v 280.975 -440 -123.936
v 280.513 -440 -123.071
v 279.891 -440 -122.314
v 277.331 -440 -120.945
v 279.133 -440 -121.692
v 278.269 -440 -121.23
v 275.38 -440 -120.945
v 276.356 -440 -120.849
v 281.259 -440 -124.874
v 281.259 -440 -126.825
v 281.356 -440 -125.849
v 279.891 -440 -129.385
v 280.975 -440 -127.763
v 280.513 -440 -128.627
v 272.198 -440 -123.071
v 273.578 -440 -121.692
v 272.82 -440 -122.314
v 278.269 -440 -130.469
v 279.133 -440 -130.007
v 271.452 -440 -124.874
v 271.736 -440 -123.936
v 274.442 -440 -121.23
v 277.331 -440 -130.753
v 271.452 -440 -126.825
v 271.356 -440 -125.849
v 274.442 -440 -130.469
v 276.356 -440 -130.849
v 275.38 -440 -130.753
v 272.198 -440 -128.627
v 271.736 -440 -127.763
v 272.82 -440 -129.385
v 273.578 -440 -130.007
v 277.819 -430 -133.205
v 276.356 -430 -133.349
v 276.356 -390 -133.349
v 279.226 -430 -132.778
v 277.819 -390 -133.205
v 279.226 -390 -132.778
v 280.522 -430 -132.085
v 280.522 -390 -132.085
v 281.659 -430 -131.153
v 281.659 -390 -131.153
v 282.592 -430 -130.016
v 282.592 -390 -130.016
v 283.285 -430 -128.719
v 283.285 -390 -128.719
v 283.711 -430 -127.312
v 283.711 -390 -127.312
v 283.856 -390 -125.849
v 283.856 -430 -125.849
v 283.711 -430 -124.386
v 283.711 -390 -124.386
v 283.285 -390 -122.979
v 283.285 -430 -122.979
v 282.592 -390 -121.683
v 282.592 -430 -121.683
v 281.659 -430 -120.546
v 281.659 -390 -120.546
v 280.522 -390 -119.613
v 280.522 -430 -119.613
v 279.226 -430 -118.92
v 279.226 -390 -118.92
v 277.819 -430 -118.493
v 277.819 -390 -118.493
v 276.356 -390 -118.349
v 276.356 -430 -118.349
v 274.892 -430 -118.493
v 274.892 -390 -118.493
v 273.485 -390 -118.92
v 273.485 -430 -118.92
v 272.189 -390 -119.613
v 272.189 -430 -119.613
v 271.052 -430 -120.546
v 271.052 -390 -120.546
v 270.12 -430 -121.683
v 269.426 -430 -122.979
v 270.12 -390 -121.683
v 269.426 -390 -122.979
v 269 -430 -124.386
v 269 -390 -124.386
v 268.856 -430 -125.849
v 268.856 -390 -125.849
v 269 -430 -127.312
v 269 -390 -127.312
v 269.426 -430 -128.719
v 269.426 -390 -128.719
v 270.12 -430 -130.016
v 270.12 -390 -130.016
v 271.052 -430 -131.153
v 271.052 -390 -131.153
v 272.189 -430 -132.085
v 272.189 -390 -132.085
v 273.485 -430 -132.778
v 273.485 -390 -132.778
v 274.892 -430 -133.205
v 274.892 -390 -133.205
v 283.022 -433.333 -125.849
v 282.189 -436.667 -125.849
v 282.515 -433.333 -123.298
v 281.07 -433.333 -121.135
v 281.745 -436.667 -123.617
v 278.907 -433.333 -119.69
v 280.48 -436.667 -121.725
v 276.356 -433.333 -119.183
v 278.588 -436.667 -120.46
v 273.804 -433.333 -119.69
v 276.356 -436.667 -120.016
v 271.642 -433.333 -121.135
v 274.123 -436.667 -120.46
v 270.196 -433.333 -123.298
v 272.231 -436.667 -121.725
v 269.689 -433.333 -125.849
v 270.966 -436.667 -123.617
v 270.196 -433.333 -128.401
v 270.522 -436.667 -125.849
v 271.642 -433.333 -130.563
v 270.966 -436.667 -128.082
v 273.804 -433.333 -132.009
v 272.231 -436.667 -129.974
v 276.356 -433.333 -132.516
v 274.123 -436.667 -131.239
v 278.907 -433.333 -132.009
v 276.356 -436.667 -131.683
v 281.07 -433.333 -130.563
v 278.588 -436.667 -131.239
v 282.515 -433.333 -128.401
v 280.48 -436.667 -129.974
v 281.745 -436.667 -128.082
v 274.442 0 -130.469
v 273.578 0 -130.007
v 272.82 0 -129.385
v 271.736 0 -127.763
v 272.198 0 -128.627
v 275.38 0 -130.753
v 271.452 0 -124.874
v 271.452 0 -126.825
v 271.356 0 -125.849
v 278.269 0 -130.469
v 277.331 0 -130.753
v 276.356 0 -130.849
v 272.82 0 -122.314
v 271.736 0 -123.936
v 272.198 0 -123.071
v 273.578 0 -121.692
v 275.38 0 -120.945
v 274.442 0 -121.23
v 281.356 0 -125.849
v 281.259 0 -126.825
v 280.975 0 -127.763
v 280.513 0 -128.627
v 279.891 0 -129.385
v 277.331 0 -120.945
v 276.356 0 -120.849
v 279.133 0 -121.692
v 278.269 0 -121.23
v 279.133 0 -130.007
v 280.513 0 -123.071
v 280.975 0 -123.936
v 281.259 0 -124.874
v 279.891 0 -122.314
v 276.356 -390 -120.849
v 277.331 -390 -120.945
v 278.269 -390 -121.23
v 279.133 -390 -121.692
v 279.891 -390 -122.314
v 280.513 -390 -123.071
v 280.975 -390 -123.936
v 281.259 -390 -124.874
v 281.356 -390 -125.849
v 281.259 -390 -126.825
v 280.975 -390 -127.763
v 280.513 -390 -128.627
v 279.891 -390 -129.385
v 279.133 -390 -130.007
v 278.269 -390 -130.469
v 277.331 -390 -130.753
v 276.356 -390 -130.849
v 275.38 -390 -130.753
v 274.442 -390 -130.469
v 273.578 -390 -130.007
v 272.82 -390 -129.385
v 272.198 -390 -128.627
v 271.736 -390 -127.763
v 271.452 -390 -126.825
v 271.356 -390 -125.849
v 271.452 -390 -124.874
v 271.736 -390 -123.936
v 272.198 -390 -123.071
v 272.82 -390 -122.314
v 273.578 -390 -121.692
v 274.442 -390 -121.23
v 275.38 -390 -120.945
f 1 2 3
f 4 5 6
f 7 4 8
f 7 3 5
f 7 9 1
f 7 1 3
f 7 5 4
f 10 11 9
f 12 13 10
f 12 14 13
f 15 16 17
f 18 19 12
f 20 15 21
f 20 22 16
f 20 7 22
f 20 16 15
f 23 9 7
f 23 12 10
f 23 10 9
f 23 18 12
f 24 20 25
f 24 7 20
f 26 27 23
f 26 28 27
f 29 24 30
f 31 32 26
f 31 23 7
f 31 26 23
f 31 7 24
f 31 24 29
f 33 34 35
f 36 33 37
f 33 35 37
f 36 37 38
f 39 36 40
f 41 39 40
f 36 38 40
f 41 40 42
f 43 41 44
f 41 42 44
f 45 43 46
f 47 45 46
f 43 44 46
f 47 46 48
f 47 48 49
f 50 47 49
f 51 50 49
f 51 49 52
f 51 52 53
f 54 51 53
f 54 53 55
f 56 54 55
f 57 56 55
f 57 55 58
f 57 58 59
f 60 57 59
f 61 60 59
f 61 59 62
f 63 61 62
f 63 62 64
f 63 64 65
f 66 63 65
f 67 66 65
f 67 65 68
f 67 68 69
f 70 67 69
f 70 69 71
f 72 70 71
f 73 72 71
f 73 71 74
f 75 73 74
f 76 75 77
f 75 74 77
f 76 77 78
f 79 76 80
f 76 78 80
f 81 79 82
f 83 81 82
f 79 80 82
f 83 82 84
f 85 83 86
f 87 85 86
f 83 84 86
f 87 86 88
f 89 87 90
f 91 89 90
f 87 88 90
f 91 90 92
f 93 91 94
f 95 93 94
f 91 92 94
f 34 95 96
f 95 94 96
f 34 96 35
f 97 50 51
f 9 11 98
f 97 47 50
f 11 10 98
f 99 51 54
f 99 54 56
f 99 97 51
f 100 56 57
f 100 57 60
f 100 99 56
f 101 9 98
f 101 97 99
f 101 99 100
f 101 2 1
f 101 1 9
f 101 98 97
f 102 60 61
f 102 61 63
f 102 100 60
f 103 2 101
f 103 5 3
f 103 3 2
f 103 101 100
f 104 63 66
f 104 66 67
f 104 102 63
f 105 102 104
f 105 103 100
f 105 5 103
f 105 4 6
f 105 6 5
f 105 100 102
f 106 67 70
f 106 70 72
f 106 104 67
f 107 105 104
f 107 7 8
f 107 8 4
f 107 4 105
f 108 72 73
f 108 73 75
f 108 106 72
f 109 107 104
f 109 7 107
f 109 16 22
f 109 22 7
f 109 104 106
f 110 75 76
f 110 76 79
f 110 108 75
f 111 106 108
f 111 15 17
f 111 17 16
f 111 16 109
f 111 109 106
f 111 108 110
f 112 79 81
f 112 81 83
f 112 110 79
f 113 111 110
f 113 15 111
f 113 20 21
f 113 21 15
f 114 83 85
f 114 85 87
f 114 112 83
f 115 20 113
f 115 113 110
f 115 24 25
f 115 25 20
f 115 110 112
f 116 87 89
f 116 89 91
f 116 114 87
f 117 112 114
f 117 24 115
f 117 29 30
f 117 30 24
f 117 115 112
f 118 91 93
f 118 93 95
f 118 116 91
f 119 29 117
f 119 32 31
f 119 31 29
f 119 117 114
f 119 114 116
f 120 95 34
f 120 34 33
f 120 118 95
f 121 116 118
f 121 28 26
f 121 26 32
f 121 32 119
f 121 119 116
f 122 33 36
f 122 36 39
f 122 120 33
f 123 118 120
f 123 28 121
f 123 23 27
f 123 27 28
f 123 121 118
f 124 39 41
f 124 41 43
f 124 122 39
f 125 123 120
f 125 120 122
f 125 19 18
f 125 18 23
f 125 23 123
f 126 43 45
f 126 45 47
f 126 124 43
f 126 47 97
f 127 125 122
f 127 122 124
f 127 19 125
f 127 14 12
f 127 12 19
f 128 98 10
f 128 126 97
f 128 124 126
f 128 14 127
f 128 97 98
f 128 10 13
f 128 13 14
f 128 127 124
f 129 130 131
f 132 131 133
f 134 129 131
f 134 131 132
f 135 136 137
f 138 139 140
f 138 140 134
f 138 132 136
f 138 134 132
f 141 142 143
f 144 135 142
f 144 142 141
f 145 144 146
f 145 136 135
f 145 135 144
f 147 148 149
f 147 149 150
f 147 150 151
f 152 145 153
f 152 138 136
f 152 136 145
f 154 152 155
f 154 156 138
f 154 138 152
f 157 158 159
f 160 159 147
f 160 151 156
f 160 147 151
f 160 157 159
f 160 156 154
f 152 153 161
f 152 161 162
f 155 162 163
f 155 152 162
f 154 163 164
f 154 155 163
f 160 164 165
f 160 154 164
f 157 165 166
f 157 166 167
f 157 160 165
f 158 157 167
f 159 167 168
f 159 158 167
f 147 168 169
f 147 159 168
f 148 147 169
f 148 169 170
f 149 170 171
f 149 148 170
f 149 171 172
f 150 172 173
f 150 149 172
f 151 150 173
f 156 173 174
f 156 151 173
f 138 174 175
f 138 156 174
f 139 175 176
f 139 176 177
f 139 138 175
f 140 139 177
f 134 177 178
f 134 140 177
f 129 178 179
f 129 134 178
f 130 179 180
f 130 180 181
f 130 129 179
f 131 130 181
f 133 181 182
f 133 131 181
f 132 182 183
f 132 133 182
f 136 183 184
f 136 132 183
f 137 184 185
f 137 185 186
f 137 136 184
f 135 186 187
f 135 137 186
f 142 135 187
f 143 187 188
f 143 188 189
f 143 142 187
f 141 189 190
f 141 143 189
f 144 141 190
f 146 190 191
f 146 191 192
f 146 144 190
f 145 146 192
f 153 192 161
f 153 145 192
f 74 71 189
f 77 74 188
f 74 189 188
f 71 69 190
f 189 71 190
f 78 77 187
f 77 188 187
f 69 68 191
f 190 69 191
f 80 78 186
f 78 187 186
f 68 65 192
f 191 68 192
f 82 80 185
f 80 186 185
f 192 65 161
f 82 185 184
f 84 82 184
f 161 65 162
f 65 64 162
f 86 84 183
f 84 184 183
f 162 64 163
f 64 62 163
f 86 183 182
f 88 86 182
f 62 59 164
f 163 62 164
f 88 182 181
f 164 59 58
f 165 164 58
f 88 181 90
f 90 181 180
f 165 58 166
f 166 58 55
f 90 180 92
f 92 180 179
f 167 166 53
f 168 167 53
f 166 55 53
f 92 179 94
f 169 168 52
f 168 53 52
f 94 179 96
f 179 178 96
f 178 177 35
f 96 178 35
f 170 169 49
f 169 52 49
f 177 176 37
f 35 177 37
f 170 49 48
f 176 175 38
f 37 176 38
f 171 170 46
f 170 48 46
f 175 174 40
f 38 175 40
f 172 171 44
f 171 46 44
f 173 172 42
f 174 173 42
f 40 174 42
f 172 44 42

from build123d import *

# Parameters (mm, degrees)
SKETCH19_R          = 5
BOSS_EXTRUDE1_DEPTH = 390
SKETCH25_R          = 7.5
BOSS_EXTRUDE2_DEPTH = 40
SKETCH26_R          = 7.5
SKETCH27_R          = 5


with BuildPart() as part:
    # Sketch19 → Boss-Extrude1 (new body)
    with BuildSketch(Plane(origin=(0, 0, 0), x_dir=(1, 0, 0), z_dir=(0, 1, 0))):
        with Locations(Location((276.355570331, 125.849309684, 0), (0, 0, 270))):
            Circle(SKETCH19_R)
    extrude(amount=-BOSS_EXTRUDE1_DEPTH)

    # Sketch25 → Boss-Extrude2 (add)
    with BuildSketch(Plane.XZ.offset(390)):
        with Locations(Location((276.355570331, -125.849309684, 0), (0, 0, 270))):
            Circle(SKETCH25_R)
    extrude(amount=BOSS_EXTRUDE2_DEPTH)

    # Sketch26 → Loft1 section 0
    with BuildSketch(Plane.XZ.offset(430)):
        with Locations((276.355570331, -125.849309684)):
            Circle(SKETCH26_R)
    # Sketch27 → Loft1 section 1
    with BuildSketch(Plane(origin=(0, -440, 0), x_dir=(-1, 0, 0), z_dir=(0, -1, 0))):
        with Locations((-276.355570331, 125.849309684)):
            Circle(SKETCH27_R)
    loft()


solid = part.part
